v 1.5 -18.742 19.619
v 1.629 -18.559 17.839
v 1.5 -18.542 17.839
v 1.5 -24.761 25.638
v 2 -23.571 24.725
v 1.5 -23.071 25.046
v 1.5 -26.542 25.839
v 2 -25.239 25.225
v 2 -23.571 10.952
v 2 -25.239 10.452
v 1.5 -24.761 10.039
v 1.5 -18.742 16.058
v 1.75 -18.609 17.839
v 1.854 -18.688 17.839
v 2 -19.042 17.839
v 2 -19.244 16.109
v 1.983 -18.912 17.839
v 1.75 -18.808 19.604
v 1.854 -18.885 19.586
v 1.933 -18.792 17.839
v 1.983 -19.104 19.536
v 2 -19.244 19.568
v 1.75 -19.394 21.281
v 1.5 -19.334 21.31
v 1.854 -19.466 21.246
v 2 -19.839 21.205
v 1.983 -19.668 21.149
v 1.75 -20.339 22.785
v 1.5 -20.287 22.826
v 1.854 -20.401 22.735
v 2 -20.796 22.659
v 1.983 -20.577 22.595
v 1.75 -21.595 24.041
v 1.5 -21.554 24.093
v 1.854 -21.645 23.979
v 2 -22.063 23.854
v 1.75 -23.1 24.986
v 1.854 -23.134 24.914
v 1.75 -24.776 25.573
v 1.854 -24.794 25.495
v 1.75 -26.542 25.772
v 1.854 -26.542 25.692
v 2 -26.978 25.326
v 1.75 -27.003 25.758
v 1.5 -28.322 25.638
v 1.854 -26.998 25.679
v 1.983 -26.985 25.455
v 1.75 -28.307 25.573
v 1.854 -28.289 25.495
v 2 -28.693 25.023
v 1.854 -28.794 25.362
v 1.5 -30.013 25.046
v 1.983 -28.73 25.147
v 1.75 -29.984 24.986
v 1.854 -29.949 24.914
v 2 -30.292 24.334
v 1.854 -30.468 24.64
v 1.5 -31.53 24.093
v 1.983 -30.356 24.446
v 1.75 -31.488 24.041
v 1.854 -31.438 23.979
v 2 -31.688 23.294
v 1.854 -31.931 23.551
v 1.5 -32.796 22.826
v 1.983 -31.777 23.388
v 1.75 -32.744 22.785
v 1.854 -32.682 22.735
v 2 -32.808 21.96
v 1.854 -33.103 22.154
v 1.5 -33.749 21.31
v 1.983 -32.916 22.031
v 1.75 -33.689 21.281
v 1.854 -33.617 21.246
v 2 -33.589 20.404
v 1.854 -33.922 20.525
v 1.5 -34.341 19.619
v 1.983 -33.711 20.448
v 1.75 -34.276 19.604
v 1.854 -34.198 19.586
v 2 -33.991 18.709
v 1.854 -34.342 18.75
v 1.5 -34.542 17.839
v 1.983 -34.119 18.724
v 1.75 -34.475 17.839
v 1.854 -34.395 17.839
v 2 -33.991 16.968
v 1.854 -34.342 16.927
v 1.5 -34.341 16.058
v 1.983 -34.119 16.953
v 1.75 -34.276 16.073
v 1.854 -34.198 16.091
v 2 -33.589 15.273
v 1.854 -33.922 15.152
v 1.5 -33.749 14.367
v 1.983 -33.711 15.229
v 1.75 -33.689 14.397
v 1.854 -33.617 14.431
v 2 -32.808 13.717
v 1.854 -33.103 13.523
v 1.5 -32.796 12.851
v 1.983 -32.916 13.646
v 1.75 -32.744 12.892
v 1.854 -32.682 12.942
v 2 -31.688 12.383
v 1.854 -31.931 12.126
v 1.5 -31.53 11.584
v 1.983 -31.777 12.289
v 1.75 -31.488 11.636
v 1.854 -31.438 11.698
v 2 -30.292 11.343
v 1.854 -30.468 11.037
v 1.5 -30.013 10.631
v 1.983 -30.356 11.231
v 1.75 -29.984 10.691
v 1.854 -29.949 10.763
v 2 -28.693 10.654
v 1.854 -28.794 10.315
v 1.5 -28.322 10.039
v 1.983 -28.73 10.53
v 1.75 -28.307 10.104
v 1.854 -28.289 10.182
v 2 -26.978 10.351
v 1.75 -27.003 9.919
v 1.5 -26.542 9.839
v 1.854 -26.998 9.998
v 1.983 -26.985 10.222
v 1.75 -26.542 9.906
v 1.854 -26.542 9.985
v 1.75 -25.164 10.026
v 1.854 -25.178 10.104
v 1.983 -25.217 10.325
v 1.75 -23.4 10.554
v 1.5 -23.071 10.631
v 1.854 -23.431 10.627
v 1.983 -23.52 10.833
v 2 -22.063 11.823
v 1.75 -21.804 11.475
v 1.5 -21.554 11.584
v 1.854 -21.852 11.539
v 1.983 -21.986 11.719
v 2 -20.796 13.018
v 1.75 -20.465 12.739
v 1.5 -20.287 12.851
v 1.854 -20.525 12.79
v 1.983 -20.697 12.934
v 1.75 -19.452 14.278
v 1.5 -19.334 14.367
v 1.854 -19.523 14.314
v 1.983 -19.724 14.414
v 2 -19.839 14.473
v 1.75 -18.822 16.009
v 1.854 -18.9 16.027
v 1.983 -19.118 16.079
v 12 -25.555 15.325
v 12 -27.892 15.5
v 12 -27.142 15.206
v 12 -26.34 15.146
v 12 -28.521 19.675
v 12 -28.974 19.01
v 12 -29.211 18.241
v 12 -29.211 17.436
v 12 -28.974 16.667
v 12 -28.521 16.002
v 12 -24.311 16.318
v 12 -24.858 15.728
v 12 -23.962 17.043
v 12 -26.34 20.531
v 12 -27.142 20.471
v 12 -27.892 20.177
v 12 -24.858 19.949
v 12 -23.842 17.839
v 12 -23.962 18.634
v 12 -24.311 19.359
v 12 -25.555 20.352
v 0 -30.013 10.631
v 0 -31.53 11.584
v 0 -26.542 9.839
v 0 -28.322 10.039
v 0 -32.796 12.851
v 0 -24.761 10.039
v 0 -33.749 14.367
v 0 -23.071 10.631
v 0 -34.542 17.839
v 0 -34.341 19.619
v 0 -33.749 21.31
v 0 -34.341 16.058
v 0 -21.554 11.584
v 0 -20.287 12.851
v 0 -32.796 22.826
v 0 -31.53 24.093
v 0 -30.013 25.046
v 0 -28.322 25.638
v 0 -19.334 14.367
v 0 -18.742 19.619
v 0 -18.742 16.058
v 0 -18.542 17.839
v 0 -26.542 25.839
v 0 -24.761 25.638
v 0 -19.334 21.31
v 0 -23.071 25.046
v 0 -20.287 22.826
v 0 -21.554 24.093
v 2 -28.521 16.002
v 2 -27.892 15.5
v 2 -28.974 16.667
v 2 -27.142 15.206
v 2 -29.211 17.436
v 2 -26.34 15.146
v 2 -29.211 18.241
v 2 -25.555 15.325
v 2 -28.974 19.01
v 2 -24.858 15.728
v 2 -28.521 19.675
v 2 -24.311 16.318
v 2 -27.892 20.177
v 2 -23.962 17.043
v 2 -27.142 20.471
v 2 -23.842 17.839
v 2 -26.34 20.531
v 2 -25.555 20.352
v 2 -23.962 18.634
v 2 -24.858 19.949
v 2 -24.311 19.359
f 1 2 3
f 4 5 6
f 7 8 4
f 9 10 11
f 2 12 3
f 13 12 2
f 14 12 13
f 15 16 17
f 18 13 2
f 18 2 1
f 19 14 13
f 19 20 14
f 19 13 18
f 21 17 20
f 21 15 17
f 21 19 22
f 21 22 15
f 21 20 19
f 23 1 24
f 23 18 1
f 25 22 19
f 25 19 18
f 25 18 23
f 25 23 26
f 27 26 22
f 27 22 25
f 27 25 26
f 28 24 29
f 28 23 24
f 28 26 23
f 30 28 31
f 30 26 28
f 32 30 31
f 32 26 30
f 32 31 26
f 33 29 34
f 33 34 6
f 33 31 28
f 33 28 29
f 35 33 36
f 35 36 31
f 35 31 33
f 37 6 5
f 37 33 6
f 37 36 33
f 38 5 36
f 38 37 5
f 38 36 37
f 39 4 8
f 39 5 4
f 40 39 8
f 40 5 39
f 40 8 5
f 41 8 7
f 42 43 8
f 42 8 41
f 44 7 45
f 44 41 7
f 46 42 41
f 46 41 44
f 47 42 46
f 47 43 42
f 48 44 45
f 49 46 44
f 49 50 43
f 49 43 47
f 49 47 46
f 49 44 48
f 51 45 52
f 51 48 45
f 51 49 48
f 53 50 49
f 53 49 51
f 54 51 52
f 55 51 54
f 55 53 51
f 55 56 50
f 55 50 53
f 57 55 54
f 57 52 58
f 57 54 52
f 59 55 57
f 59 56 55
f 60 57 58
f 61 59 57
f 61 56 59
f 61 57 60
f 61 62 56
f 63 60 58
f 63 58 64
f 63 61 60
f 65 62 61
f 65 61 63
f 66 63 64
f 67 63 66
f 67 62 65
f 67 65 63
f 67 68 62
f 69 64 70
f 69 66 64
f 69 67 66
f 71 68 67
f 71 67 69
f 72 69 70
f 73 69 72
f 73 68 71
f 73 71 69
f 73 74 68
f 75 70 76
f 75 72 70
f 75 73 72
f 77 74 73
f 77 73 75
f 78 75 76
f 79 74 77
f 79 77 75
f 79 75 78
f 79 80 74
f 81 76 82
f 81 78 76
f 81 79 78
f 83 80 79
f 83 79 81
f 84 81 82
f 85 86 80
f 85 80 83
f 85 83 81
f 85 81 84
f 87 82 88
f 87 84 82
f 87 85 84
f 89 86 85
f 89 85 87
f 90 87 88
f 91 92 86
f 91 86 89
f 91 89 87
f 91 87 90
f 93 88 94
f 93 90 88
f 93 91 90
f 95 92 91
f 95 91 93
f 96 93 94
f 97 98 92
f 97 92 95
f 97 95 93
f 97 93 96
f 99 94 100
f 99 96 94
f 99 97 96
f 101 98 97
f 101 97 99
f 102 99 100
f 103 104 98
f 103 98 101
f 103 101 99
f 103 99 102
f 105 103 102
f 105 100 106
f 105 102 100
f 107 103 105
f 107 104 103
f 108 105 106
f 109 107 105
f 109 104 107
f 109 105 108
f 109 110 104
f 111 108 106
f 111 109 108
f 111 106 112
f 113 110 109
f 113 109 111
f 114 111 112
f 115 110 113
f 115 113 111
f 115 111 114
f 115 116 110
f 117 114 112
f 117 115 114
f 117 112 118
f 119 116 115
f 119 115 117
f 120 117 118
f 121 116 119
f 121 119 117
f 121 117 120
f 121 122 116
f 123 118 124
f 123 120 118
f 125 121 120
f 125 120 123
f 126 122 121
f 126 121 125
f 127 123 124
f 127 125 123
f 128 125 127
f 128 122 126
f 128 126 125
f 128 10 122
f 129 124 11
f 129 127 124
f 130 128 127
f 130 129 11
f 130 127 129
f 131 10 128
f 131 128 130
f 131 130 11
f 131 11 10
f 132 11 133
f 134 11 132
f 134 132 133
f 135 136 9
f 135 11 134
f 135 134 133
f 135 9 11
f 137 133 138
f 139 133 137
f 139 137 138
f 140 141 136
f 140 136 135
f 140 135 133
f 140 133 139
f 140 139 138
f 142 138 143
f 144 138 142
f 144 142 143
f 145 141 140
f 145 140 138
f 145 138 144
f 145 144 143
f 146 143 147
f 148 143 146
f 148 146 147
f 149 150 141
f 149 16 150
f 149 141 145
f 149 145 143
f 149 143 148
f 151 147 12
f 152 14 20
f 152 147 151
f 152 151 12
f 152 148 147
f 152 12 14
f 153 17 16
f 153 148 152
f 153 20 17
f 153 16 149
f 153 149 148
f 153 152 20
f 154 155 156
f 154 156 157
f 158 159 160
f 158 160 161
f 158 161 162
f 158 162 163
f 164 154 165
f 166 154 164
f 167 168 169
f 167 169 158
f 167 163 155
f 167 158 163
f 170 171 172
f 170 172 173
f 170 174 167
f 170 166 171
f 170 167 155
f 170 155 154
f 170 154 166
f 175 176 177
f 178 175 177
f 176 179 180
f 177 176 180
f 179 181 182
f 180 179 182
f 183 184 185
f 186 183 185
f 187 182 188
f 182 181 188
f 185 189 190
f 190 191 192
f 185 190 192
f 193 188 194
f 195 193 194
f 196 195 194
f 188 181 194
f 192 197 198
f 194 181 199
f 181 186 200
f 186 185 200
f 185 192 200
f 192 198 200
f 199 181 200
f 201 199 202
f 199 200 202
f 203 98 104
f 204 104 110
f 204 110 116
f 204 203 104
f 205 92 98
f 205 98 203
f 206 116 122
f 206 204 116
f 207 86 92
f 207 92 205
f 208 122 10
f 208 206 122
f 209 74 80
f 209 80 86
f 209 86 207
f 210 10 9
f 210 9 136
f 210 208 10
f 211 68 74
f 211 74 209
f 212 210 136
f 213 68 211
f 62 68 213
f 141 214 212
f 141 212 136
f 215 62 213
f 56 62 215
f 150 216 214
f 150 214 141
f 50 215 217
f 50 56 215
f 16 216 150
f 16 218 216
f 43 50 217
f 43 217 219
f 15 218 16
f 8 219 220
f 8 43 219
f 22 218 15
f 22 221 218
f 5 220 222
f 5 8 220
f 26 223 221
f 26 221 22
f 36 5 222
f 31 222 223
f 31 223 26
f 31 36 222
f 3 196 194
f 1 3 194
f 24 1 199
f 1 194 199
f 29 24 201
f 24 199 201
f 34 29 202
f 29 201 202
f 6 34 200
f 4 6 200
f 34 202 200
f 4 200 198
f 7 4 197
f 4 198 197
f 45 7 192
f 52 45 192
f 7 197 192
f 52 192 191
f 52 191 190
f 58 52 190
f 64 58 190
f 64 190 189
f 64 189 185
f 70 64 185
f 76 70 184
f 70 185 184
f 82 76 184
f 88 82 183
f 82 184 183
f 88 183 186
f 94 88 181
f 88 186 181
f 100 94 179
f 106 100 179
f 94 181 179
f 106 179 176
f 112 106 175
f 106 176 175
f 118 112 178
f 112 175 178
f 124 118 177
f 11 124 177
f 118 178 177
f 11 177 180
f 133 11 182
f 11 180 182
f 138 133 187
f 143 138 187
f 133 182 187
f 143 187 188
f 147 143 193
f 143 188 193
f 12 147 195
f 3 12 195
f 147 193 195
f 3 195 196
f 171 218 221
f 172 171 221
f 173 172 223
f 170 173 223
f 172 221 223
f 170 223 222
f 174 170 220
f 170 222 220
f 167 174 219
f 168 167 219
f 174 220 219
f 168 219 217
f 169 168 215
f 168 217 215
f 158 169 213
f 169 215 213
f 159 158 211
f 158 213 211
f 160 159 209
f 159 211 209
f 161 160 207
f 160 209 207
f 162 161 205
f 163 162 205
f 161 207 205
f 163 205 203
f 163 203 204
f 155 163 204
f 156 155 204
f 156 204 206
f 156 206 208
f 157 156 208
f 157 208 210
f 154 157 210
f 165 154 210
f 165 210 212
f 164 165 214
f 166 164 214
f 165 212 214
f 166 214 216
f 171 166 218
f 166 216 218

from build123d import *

# Parameters (mm, degrees)
F0_R     = 8
F1_DEPTH = 2
F2_R     = 2.7
F3_DEPTH = 10
F4_R     = 0.5


with BuildPart() as f1:
    # F0 (on Right) → F1 (new body)
    with BuildSketch(Plane.YZ):
        with Locations((-26.541635, 17.838527)):
            Circle(F0_R)
    extrude(amount=F1_DEPTH)

    # F2 (on face) → F3 (join)
    with BuildSketch(Plane.YZ.offset(2)):
        with Locations((-26.541635, 17.838527)):
            Circle(F2_R)
    extrude(amount=F3_DEPTH)

    # F4
    f4_edges = [f1.edges().sort_by_distance(p)[0] for p in [
        (2, -34.541635, 17.838527),
    ]]
    fillet(f4_edges, radius=F4_R)


solid = f1.part
